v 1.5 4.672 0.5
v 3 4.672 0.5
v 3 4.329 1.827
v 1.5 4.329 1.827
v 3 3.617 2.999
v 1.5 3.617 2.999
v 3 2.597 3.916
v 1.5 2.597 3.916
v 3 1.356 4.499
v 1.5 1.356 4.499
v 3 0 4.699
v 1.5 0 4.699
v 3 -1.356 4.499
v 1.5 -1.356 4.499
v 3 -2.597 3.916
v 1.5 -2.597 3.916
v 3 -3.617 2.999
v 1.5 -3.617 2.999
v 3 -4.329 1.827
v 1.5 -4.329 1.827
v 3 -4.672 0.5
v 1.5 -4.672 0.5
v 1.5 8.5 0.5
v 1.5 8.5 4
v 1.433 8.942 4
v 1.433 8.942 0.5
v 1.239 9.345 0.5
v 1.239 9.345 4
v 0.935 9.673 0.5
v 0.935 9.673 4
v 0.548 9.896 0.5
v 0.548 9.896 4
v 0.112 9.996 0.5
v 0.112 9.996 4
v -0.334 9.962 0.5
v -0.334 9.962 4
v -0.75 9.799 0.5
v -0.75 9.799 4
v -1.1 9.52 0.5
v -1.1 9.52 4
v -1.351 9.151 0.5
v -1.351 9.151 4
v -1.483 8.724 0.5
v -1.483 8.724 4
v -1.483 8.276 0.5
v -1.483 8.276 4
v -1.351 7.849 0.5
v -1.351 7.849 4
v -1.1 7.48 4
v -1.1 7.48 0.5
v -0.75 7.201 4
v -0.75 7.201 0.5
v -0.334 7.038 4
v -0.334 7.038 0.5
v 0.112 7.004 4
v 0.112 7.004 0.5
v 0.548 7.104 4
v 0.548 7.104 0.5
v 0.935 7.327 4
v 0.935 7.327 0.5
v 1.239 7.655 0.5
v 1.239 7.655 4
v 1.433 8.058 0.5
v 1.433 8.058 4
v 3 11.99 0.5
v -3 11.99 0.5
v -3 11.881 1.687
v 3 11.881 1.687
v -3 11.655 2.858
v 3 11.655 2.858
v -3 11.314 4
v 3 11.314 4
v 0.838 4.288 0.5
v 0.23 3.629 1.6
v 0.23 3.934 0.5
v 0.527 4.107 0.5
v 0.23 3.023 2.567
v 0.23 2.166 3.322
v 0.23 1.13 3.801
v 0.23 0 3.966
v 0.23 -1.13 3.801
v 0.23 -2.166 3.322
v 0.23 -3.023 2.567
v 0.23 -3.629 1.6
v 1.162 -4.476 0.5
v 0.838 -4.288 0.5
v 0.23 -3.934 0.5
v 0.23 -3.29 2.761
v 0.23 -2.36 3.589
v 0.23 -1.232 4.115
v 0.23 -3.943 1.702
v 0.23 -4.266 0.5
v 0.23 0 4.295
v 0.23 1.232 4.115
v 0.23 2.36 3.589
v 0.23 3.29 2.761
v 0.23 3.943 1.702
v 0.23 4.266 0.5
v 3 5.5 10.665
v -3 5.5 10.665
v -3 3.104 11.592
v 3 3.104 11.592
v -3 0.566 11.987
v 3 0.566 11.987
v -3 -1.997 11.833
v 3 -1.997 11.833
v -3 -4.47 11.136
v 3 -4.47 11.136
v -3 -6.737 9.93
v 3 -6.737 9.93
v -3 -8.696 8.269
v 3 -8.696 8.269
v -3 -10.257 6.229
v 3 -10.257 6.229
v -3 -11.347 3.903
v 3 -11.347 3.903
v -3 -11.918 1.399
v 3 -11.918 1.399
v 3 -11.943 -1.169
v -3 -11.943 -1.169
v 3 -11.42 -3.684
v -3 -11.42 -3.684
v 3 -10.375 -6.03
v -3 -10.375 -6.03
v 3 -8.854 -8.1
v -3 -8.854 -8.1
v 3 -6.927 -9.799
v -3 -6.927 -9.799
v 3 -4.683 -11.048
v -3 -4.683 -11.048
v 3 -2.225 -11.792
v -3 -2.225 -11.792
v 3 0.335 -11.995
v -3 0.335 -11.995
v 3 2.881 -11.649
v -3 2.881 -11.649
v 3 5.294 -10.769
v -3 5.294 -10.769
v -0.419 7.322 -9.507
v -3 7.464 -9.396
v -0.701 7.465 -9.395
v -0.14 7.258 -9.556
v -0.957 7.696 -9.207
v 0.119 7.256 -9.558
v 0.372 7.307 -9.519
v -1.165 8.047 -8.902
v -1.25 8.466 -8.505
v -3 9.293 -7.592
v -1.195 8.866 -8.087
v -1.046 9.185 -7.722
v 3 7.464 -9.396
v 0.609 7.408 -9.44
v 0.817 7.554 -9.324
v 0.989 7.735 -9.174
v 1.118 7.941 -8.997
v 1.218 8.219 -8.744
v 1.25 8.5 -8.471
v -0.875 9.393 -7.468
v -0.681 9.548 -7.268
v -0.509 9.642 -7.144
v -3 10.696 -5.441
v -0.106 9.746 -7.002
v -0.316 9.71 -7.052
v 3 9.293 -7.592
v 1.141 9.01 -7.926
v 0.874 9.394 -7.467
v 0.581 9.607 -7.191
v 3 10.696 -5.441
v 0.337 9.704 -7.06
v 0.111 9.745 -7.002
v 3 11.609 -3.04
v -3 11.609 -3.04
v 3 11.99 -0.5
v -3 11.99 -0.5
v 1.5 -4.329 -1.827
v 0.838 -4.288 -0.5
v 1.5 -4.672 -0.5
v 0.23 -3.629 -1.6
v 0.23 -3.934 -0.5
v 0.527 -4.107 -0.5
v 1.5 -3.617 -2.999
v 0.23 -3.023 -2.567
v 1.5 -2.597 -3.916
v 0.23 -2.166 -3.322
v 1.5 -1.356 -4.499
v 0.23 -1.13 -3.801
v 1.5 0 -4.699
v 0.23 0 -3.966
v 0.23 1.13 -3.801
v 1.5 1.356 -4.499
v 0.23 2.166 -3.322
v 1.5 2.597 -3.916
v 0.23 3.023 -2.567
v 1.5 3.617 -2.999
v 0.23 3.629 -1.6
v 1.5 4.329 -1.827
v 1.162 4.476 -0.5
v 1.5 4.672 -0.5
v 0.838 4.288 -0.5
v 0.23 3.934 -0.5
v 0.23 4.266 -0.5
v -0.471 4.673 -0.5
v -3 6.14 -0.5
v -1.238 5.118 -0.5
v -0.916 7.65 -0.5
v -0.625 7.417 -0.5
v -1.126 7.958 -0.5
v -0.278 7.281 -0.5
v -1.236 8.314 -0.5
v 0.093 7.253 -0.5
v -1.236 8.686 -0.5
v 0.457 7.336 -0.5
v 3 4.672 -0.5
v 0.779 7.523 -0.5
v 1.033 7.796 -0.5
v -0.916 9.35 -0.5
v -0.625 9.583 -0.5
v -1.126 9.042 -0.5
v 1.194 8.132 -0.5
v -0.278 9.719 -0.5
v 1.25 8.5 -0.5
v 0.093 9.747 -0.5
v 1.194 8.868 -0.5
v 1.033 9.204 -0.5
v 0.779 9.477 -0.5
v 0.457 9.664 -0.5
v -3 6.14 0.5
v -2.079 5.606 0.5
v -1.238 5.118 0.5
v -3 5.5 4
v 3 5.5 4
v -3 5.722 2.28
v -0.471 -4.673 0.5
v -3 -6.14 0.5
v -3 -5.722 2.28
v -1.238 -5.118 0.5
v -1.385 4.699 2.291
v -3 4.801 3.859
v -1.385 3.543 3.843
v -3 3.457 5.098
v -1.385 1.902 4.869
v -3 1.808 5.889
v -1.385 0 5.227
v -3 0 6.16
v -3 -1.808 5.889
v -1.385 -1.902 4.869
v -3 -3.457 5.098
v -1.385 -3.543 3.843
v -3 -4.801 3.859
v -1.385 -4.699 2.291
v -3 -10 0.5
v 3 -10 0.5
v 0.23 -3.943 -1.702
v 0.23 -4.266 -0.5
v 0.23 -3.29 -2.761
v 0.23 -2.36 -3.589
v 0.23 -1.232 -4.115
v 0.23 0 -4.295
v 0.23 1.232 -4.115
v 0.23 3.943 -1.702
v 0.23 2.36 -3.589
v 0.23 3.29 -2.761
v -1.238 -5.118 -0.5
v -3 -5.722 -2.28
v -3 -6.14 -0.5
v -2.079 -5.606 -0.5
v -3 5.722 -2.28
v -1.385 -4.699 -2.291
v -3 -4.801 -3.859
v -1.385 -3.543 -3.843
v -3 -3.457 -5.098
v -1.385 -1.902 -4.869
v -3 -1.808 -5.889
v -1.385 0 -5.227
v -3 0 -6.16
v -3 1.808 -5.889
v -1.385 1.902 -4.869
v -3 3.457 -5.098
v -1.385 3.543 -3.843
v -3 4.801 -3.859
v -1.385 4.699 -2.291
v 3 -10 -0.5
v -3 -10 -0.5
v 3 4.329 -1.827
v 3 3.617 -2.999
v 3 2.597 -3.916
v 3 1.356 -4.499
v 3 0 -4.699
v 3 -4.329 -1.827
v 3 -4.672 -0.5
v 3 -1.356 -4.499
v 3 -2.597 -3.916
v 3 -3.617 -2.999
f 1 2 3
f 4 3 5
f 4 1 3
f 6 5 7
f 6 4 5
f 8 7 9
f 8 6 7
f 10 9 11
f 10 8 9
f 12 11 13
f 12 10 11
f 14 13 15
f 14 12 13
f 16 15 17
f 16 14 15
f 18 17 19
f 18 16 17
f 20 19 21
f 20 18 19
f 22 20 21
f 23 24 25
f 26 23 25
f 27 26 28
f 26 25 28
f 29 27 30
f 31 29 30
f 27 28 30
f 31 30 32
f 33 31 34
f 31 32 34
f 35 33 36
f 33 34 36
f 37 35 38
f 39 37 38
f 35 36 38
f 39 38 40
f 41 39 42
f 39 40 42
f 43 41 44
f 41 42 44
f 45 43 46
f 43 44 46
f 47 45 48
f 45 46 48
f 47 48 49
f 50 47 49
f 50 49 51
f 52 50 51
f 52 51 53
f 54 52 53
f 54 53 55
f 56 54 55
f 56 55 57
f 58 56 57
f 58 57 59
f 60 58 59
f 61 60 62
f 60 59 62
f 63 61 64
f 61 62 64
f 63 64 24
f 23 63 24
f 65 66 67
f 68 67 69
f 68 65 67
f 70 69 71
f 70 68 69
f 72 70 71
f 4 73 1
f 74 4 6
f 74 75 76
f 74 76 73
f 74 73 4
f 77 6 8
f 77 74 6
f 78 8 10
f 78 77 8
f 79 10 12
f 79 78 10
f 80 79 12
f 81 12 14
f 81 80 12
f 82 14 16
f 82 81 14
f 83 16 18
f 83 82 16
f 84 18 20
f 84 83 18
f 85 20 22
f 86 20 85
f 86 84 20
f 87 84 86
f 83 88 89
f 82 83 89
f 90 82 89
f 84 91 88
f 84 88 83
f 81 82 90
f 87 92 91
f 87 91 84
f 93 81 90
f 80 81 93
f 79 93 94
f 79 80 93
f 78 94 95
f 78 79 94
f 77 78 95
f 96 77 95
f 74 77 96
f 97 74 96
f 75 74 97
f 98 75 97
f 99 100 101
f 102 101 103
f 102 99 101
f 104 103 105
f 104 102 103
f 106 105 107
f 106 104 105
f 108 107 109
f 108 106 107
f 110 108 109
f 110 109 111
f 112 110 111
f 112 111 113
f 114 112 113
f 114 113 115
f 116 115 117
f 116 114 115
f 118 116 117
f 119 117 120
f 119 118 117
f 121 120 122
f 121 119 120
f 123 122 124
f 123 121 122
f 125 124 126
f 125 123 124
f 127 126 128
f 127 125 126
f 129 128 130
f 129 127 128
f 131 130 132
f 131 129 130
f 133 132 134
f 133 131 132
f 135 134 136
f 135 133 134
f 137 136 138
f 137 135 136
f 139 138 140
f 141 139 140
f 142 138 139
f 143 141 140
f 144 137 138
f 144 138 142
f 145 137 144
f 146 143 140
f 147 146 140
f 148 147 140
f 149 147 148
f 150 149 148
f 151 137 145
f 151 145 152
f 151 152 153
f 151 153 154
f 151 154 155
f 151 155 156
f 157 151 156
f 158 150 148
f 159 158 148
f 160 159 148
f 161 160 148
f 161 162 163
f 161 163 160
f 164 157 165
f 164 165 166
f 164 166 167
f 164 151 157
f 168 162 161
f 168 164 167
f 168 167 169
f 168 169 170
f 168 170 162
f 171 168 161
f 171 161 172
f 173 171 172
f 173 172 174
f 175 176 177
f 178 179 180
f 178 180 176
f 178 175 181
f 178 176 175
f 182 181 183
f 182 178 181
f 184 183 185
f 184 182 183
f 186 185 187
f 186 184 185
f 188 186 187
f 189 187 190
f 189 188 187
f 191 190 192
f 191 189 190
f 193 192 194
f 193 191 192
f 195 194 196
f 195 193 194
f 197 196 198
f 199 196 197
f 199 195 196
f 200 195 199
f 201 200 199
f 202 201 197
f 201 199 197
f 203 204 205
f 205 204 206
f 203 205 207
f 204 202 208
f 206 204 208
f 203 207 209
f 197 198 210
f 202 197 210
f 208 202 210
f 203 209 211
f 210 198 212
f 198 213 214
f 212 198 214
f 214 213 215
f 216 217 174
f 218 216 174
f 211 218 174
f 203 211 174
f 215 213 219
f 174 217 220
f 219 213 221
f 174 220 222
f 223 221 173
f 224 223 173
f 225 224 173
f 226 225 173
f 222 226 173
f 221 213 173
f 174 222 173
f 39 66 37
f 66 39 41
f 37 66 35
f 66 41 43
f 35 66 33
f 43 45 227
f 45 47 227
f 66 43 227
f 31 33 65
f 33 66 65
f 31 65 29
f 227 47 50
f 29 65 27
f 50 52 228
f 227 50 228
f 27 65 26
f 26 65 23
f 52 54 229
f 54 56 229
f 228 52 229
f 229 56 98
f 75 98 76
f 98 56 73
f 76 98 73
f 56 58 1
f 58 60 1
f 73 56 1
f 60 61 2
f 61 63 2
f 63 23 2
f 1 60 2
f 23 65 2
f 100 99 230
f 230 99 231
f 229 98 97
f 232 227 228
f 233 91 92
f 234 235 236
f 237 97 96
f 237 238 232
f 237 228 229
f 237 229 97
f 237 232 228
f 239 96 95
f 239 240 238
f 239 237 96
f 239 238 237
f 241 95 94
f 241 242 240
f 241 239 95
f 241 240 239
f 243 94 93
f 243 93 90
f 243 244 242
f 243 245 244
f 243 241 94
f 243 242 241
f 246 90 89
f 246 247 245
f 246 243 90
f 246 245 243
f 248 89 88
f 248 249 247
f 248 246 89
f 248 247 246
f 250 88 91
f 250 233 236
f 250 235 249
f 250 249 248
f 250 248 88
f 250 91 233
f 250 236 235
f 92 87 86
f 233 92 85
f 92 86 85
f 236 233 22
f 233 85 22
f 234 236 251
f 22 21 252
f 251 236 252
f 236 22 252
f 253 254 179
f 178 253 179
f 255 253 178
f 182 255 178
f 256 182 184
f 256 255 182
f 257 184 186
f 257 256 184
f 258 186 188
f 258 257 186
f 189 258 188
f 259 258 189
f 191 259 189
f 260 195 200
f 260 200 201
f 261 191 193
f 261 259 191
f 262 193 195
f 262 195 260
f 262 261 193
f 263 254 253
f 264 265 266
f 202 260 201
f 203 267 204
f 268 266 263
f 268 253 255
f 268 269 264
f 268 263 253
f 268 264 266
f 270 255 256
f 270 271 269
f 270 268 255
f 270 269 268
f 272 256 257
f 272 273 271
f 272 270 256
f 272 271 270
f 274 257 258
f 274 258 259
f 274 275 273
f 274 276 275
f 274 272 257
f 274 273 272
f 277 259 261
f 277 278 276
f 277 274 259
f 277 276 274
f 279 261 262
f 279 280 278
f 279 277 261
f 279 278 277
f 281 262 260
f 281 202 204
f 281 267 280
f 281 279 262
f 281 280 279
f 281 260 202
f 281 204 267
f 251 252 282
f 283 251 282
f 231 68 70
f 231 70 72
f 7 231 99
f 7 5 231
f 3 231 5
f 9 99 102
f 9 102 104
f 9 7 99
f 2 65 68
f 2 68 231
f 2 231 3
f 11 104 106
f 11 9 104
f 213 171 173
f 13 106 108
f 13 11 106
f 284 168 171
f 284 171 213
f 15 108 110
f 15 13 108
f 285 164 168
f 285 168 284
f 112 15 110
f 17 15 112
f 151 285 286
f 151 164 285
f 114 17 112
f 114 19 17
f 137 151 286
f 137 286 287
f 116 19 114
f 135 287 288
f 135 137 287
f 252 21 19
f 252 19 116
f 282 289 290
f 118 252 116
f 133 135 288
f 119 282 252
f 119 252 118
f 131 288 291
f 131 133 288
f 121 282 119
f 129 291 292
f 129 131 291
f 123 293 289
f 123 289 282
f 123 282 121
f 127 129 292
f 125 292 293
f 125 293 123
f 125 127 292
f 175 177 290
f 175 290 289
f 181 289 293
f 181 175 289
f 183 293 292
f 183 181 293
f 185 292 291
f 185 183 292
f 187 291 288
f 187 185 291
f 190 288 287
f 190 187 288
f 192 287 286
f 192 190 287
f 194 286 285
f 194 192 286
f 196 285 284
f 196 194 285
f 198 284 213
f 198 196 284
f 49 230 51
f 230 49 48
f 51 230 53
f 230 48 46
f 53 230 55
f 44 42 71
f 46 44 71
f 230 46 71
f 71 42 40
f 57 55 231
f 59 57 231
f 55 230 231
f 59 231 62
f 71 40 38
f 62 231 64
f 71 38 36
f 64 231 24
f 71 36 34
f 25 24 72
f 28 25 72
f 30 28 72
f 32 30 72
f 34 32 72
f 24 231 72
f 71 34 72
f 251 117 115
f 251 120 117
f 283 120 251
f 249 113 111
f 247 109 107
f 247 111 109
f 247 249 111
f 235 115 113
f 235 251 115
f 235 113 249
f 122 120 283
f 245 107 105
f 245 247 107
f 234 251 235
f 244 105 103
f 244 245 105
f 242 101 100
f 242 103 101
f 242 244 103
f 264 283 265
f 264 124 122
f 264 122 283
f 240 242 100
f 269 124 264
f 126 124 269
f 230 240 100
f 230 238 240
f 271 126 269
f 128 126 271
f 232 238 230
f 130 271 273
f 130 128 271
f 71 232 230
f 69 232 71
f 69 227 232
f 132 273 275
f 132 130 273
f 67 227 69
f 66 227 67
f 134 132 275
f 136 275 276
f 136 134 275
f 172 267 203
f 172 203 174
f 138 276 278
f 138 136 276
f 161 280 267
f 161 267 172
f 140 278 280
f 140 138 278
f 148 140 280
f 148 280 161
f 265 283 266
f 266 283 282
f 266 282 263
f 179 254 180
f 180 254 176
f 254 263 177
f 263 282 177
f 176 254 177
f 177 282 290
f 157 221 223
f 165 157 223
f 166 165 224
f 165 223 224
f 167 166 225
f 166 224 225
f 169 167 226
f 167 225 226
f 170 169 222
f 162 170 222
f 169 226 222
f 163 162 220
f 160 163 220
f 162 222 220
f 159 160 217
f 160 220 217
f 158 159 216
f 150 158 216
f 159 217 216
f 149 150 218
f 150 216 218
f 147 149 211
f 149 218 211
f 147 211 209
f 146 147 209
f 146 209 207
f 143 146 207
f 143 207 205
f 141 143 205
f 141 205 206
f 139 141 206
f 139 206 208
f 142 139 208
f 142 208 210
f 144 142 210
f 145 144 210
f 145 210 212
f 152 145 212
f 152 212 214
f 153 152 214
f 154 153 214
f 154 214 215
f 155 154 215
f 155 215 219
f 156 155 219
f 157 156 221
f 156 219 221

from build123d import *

# Parameters (mm, degrees)
F3_DEPTH = 6.001
F4_R     = 1.5
F5_DEPTH = 3.5
F6_R     = 1.25
F7_DEPTH = 11.501


with BuildPart() as f1:
    # F0 (on Top) → F1 (revolve)
    with BuildSketch(Plane.XY):
        Polygon((3, -12), (3, -4.699), (1.5, -4.699), (0.23, -3.965765), (0.23, -4.295025), (-3, -6.159867), (-3, -12), align=None)
    revolve(axis=Axis((1.9254176877, 0, 0), (1, 0, 0)))

    # F2 (on face) → F3 (cut, through all)
    with BuildSketch(Plane.YZ.offset(3)):
        with BuildLine():
            ThreePointArc((11.313708499, 4), (9.0433383971, 7.8878406827), (5.5, 10.6653645039))
            Line((5.5, 10.6653645039), (5.5, 4))
            Line((5.5, 4), (11.313708499, 4))
        make_face()
        with BuildLine():
            Line((4.6723228698, -0.5), (11.9895788083, -0.5))
            ThreePointArc((11.9895788083, -0.5), (11.9973944192, -0.2500542947), (12, 0))
            ThreePointArc((12, 0), (11.9973944192, 0.2500542947), (11.9895788083, 0.5))
            Line((11.9895788083, 0.5), (4.6723228698, 0.5))
            ThreePointArc((4.6723228698, 0.5), (4.6923259779, 0.2503555818), (4.699, 0))
            ThreePointArc((4.699, 0), (4.6923259779, -0.2503555818), (4.6723228698, -0.5))
        make_face()
        with BuildLine():
            Line((-10, -0.5), (-4.6723228698, -0.5))
            ThreePointArc((-4.6723228698, -0.5), (-4.699, 0), (-4.6723228698, 0.5))
            Line((-4.6723228698, 0.5), (-10, 0.5))
            Line((-10, 0.5), (-10, -0.5))
        make_face()
        with BuildLine():
            Line((-4.6723228698, -0.5), (4.6723228698, -0.5))
            ThreePointArc((4.6723228698, -0.5), (4.6923259779, -0.2503555818), (4.699, 0))
            ThreePointArc((4.699, 0), (4.6923259779, 0.2503555818), (4.6723228698, 0.5))
            Line((4.6723228698, 0.5), (-4.6723228698, 0.5))
            ThreePointArc((-4.6723228698, 0.5), (-4.699, 0), (-4.6723228698, -0.5))
        make_face()
    extrude(amount=-F3_DEPTH, mode=Mode.SUBTRACT)

    # F4 (on face) → F5 (cut, through all)
    with BuildSketch(Plane.XY.offset(4)):
        with Locations((0, 8.5)):
            Circle(F4_R)
    extrude(amount=-F5_DEPTH, mode=Mode.SUBTRACT)

    # F6 (on face) → F7 (cut, through all)
    with BuildSketch(Plane.XY.offset(-0.5)):
        with Locations((0, 8.5)):
            Circle(F6_R)
    extrude(amount=-F7_DEPTH, mode=Mode.SUBTRACT)


solid = f1.part
